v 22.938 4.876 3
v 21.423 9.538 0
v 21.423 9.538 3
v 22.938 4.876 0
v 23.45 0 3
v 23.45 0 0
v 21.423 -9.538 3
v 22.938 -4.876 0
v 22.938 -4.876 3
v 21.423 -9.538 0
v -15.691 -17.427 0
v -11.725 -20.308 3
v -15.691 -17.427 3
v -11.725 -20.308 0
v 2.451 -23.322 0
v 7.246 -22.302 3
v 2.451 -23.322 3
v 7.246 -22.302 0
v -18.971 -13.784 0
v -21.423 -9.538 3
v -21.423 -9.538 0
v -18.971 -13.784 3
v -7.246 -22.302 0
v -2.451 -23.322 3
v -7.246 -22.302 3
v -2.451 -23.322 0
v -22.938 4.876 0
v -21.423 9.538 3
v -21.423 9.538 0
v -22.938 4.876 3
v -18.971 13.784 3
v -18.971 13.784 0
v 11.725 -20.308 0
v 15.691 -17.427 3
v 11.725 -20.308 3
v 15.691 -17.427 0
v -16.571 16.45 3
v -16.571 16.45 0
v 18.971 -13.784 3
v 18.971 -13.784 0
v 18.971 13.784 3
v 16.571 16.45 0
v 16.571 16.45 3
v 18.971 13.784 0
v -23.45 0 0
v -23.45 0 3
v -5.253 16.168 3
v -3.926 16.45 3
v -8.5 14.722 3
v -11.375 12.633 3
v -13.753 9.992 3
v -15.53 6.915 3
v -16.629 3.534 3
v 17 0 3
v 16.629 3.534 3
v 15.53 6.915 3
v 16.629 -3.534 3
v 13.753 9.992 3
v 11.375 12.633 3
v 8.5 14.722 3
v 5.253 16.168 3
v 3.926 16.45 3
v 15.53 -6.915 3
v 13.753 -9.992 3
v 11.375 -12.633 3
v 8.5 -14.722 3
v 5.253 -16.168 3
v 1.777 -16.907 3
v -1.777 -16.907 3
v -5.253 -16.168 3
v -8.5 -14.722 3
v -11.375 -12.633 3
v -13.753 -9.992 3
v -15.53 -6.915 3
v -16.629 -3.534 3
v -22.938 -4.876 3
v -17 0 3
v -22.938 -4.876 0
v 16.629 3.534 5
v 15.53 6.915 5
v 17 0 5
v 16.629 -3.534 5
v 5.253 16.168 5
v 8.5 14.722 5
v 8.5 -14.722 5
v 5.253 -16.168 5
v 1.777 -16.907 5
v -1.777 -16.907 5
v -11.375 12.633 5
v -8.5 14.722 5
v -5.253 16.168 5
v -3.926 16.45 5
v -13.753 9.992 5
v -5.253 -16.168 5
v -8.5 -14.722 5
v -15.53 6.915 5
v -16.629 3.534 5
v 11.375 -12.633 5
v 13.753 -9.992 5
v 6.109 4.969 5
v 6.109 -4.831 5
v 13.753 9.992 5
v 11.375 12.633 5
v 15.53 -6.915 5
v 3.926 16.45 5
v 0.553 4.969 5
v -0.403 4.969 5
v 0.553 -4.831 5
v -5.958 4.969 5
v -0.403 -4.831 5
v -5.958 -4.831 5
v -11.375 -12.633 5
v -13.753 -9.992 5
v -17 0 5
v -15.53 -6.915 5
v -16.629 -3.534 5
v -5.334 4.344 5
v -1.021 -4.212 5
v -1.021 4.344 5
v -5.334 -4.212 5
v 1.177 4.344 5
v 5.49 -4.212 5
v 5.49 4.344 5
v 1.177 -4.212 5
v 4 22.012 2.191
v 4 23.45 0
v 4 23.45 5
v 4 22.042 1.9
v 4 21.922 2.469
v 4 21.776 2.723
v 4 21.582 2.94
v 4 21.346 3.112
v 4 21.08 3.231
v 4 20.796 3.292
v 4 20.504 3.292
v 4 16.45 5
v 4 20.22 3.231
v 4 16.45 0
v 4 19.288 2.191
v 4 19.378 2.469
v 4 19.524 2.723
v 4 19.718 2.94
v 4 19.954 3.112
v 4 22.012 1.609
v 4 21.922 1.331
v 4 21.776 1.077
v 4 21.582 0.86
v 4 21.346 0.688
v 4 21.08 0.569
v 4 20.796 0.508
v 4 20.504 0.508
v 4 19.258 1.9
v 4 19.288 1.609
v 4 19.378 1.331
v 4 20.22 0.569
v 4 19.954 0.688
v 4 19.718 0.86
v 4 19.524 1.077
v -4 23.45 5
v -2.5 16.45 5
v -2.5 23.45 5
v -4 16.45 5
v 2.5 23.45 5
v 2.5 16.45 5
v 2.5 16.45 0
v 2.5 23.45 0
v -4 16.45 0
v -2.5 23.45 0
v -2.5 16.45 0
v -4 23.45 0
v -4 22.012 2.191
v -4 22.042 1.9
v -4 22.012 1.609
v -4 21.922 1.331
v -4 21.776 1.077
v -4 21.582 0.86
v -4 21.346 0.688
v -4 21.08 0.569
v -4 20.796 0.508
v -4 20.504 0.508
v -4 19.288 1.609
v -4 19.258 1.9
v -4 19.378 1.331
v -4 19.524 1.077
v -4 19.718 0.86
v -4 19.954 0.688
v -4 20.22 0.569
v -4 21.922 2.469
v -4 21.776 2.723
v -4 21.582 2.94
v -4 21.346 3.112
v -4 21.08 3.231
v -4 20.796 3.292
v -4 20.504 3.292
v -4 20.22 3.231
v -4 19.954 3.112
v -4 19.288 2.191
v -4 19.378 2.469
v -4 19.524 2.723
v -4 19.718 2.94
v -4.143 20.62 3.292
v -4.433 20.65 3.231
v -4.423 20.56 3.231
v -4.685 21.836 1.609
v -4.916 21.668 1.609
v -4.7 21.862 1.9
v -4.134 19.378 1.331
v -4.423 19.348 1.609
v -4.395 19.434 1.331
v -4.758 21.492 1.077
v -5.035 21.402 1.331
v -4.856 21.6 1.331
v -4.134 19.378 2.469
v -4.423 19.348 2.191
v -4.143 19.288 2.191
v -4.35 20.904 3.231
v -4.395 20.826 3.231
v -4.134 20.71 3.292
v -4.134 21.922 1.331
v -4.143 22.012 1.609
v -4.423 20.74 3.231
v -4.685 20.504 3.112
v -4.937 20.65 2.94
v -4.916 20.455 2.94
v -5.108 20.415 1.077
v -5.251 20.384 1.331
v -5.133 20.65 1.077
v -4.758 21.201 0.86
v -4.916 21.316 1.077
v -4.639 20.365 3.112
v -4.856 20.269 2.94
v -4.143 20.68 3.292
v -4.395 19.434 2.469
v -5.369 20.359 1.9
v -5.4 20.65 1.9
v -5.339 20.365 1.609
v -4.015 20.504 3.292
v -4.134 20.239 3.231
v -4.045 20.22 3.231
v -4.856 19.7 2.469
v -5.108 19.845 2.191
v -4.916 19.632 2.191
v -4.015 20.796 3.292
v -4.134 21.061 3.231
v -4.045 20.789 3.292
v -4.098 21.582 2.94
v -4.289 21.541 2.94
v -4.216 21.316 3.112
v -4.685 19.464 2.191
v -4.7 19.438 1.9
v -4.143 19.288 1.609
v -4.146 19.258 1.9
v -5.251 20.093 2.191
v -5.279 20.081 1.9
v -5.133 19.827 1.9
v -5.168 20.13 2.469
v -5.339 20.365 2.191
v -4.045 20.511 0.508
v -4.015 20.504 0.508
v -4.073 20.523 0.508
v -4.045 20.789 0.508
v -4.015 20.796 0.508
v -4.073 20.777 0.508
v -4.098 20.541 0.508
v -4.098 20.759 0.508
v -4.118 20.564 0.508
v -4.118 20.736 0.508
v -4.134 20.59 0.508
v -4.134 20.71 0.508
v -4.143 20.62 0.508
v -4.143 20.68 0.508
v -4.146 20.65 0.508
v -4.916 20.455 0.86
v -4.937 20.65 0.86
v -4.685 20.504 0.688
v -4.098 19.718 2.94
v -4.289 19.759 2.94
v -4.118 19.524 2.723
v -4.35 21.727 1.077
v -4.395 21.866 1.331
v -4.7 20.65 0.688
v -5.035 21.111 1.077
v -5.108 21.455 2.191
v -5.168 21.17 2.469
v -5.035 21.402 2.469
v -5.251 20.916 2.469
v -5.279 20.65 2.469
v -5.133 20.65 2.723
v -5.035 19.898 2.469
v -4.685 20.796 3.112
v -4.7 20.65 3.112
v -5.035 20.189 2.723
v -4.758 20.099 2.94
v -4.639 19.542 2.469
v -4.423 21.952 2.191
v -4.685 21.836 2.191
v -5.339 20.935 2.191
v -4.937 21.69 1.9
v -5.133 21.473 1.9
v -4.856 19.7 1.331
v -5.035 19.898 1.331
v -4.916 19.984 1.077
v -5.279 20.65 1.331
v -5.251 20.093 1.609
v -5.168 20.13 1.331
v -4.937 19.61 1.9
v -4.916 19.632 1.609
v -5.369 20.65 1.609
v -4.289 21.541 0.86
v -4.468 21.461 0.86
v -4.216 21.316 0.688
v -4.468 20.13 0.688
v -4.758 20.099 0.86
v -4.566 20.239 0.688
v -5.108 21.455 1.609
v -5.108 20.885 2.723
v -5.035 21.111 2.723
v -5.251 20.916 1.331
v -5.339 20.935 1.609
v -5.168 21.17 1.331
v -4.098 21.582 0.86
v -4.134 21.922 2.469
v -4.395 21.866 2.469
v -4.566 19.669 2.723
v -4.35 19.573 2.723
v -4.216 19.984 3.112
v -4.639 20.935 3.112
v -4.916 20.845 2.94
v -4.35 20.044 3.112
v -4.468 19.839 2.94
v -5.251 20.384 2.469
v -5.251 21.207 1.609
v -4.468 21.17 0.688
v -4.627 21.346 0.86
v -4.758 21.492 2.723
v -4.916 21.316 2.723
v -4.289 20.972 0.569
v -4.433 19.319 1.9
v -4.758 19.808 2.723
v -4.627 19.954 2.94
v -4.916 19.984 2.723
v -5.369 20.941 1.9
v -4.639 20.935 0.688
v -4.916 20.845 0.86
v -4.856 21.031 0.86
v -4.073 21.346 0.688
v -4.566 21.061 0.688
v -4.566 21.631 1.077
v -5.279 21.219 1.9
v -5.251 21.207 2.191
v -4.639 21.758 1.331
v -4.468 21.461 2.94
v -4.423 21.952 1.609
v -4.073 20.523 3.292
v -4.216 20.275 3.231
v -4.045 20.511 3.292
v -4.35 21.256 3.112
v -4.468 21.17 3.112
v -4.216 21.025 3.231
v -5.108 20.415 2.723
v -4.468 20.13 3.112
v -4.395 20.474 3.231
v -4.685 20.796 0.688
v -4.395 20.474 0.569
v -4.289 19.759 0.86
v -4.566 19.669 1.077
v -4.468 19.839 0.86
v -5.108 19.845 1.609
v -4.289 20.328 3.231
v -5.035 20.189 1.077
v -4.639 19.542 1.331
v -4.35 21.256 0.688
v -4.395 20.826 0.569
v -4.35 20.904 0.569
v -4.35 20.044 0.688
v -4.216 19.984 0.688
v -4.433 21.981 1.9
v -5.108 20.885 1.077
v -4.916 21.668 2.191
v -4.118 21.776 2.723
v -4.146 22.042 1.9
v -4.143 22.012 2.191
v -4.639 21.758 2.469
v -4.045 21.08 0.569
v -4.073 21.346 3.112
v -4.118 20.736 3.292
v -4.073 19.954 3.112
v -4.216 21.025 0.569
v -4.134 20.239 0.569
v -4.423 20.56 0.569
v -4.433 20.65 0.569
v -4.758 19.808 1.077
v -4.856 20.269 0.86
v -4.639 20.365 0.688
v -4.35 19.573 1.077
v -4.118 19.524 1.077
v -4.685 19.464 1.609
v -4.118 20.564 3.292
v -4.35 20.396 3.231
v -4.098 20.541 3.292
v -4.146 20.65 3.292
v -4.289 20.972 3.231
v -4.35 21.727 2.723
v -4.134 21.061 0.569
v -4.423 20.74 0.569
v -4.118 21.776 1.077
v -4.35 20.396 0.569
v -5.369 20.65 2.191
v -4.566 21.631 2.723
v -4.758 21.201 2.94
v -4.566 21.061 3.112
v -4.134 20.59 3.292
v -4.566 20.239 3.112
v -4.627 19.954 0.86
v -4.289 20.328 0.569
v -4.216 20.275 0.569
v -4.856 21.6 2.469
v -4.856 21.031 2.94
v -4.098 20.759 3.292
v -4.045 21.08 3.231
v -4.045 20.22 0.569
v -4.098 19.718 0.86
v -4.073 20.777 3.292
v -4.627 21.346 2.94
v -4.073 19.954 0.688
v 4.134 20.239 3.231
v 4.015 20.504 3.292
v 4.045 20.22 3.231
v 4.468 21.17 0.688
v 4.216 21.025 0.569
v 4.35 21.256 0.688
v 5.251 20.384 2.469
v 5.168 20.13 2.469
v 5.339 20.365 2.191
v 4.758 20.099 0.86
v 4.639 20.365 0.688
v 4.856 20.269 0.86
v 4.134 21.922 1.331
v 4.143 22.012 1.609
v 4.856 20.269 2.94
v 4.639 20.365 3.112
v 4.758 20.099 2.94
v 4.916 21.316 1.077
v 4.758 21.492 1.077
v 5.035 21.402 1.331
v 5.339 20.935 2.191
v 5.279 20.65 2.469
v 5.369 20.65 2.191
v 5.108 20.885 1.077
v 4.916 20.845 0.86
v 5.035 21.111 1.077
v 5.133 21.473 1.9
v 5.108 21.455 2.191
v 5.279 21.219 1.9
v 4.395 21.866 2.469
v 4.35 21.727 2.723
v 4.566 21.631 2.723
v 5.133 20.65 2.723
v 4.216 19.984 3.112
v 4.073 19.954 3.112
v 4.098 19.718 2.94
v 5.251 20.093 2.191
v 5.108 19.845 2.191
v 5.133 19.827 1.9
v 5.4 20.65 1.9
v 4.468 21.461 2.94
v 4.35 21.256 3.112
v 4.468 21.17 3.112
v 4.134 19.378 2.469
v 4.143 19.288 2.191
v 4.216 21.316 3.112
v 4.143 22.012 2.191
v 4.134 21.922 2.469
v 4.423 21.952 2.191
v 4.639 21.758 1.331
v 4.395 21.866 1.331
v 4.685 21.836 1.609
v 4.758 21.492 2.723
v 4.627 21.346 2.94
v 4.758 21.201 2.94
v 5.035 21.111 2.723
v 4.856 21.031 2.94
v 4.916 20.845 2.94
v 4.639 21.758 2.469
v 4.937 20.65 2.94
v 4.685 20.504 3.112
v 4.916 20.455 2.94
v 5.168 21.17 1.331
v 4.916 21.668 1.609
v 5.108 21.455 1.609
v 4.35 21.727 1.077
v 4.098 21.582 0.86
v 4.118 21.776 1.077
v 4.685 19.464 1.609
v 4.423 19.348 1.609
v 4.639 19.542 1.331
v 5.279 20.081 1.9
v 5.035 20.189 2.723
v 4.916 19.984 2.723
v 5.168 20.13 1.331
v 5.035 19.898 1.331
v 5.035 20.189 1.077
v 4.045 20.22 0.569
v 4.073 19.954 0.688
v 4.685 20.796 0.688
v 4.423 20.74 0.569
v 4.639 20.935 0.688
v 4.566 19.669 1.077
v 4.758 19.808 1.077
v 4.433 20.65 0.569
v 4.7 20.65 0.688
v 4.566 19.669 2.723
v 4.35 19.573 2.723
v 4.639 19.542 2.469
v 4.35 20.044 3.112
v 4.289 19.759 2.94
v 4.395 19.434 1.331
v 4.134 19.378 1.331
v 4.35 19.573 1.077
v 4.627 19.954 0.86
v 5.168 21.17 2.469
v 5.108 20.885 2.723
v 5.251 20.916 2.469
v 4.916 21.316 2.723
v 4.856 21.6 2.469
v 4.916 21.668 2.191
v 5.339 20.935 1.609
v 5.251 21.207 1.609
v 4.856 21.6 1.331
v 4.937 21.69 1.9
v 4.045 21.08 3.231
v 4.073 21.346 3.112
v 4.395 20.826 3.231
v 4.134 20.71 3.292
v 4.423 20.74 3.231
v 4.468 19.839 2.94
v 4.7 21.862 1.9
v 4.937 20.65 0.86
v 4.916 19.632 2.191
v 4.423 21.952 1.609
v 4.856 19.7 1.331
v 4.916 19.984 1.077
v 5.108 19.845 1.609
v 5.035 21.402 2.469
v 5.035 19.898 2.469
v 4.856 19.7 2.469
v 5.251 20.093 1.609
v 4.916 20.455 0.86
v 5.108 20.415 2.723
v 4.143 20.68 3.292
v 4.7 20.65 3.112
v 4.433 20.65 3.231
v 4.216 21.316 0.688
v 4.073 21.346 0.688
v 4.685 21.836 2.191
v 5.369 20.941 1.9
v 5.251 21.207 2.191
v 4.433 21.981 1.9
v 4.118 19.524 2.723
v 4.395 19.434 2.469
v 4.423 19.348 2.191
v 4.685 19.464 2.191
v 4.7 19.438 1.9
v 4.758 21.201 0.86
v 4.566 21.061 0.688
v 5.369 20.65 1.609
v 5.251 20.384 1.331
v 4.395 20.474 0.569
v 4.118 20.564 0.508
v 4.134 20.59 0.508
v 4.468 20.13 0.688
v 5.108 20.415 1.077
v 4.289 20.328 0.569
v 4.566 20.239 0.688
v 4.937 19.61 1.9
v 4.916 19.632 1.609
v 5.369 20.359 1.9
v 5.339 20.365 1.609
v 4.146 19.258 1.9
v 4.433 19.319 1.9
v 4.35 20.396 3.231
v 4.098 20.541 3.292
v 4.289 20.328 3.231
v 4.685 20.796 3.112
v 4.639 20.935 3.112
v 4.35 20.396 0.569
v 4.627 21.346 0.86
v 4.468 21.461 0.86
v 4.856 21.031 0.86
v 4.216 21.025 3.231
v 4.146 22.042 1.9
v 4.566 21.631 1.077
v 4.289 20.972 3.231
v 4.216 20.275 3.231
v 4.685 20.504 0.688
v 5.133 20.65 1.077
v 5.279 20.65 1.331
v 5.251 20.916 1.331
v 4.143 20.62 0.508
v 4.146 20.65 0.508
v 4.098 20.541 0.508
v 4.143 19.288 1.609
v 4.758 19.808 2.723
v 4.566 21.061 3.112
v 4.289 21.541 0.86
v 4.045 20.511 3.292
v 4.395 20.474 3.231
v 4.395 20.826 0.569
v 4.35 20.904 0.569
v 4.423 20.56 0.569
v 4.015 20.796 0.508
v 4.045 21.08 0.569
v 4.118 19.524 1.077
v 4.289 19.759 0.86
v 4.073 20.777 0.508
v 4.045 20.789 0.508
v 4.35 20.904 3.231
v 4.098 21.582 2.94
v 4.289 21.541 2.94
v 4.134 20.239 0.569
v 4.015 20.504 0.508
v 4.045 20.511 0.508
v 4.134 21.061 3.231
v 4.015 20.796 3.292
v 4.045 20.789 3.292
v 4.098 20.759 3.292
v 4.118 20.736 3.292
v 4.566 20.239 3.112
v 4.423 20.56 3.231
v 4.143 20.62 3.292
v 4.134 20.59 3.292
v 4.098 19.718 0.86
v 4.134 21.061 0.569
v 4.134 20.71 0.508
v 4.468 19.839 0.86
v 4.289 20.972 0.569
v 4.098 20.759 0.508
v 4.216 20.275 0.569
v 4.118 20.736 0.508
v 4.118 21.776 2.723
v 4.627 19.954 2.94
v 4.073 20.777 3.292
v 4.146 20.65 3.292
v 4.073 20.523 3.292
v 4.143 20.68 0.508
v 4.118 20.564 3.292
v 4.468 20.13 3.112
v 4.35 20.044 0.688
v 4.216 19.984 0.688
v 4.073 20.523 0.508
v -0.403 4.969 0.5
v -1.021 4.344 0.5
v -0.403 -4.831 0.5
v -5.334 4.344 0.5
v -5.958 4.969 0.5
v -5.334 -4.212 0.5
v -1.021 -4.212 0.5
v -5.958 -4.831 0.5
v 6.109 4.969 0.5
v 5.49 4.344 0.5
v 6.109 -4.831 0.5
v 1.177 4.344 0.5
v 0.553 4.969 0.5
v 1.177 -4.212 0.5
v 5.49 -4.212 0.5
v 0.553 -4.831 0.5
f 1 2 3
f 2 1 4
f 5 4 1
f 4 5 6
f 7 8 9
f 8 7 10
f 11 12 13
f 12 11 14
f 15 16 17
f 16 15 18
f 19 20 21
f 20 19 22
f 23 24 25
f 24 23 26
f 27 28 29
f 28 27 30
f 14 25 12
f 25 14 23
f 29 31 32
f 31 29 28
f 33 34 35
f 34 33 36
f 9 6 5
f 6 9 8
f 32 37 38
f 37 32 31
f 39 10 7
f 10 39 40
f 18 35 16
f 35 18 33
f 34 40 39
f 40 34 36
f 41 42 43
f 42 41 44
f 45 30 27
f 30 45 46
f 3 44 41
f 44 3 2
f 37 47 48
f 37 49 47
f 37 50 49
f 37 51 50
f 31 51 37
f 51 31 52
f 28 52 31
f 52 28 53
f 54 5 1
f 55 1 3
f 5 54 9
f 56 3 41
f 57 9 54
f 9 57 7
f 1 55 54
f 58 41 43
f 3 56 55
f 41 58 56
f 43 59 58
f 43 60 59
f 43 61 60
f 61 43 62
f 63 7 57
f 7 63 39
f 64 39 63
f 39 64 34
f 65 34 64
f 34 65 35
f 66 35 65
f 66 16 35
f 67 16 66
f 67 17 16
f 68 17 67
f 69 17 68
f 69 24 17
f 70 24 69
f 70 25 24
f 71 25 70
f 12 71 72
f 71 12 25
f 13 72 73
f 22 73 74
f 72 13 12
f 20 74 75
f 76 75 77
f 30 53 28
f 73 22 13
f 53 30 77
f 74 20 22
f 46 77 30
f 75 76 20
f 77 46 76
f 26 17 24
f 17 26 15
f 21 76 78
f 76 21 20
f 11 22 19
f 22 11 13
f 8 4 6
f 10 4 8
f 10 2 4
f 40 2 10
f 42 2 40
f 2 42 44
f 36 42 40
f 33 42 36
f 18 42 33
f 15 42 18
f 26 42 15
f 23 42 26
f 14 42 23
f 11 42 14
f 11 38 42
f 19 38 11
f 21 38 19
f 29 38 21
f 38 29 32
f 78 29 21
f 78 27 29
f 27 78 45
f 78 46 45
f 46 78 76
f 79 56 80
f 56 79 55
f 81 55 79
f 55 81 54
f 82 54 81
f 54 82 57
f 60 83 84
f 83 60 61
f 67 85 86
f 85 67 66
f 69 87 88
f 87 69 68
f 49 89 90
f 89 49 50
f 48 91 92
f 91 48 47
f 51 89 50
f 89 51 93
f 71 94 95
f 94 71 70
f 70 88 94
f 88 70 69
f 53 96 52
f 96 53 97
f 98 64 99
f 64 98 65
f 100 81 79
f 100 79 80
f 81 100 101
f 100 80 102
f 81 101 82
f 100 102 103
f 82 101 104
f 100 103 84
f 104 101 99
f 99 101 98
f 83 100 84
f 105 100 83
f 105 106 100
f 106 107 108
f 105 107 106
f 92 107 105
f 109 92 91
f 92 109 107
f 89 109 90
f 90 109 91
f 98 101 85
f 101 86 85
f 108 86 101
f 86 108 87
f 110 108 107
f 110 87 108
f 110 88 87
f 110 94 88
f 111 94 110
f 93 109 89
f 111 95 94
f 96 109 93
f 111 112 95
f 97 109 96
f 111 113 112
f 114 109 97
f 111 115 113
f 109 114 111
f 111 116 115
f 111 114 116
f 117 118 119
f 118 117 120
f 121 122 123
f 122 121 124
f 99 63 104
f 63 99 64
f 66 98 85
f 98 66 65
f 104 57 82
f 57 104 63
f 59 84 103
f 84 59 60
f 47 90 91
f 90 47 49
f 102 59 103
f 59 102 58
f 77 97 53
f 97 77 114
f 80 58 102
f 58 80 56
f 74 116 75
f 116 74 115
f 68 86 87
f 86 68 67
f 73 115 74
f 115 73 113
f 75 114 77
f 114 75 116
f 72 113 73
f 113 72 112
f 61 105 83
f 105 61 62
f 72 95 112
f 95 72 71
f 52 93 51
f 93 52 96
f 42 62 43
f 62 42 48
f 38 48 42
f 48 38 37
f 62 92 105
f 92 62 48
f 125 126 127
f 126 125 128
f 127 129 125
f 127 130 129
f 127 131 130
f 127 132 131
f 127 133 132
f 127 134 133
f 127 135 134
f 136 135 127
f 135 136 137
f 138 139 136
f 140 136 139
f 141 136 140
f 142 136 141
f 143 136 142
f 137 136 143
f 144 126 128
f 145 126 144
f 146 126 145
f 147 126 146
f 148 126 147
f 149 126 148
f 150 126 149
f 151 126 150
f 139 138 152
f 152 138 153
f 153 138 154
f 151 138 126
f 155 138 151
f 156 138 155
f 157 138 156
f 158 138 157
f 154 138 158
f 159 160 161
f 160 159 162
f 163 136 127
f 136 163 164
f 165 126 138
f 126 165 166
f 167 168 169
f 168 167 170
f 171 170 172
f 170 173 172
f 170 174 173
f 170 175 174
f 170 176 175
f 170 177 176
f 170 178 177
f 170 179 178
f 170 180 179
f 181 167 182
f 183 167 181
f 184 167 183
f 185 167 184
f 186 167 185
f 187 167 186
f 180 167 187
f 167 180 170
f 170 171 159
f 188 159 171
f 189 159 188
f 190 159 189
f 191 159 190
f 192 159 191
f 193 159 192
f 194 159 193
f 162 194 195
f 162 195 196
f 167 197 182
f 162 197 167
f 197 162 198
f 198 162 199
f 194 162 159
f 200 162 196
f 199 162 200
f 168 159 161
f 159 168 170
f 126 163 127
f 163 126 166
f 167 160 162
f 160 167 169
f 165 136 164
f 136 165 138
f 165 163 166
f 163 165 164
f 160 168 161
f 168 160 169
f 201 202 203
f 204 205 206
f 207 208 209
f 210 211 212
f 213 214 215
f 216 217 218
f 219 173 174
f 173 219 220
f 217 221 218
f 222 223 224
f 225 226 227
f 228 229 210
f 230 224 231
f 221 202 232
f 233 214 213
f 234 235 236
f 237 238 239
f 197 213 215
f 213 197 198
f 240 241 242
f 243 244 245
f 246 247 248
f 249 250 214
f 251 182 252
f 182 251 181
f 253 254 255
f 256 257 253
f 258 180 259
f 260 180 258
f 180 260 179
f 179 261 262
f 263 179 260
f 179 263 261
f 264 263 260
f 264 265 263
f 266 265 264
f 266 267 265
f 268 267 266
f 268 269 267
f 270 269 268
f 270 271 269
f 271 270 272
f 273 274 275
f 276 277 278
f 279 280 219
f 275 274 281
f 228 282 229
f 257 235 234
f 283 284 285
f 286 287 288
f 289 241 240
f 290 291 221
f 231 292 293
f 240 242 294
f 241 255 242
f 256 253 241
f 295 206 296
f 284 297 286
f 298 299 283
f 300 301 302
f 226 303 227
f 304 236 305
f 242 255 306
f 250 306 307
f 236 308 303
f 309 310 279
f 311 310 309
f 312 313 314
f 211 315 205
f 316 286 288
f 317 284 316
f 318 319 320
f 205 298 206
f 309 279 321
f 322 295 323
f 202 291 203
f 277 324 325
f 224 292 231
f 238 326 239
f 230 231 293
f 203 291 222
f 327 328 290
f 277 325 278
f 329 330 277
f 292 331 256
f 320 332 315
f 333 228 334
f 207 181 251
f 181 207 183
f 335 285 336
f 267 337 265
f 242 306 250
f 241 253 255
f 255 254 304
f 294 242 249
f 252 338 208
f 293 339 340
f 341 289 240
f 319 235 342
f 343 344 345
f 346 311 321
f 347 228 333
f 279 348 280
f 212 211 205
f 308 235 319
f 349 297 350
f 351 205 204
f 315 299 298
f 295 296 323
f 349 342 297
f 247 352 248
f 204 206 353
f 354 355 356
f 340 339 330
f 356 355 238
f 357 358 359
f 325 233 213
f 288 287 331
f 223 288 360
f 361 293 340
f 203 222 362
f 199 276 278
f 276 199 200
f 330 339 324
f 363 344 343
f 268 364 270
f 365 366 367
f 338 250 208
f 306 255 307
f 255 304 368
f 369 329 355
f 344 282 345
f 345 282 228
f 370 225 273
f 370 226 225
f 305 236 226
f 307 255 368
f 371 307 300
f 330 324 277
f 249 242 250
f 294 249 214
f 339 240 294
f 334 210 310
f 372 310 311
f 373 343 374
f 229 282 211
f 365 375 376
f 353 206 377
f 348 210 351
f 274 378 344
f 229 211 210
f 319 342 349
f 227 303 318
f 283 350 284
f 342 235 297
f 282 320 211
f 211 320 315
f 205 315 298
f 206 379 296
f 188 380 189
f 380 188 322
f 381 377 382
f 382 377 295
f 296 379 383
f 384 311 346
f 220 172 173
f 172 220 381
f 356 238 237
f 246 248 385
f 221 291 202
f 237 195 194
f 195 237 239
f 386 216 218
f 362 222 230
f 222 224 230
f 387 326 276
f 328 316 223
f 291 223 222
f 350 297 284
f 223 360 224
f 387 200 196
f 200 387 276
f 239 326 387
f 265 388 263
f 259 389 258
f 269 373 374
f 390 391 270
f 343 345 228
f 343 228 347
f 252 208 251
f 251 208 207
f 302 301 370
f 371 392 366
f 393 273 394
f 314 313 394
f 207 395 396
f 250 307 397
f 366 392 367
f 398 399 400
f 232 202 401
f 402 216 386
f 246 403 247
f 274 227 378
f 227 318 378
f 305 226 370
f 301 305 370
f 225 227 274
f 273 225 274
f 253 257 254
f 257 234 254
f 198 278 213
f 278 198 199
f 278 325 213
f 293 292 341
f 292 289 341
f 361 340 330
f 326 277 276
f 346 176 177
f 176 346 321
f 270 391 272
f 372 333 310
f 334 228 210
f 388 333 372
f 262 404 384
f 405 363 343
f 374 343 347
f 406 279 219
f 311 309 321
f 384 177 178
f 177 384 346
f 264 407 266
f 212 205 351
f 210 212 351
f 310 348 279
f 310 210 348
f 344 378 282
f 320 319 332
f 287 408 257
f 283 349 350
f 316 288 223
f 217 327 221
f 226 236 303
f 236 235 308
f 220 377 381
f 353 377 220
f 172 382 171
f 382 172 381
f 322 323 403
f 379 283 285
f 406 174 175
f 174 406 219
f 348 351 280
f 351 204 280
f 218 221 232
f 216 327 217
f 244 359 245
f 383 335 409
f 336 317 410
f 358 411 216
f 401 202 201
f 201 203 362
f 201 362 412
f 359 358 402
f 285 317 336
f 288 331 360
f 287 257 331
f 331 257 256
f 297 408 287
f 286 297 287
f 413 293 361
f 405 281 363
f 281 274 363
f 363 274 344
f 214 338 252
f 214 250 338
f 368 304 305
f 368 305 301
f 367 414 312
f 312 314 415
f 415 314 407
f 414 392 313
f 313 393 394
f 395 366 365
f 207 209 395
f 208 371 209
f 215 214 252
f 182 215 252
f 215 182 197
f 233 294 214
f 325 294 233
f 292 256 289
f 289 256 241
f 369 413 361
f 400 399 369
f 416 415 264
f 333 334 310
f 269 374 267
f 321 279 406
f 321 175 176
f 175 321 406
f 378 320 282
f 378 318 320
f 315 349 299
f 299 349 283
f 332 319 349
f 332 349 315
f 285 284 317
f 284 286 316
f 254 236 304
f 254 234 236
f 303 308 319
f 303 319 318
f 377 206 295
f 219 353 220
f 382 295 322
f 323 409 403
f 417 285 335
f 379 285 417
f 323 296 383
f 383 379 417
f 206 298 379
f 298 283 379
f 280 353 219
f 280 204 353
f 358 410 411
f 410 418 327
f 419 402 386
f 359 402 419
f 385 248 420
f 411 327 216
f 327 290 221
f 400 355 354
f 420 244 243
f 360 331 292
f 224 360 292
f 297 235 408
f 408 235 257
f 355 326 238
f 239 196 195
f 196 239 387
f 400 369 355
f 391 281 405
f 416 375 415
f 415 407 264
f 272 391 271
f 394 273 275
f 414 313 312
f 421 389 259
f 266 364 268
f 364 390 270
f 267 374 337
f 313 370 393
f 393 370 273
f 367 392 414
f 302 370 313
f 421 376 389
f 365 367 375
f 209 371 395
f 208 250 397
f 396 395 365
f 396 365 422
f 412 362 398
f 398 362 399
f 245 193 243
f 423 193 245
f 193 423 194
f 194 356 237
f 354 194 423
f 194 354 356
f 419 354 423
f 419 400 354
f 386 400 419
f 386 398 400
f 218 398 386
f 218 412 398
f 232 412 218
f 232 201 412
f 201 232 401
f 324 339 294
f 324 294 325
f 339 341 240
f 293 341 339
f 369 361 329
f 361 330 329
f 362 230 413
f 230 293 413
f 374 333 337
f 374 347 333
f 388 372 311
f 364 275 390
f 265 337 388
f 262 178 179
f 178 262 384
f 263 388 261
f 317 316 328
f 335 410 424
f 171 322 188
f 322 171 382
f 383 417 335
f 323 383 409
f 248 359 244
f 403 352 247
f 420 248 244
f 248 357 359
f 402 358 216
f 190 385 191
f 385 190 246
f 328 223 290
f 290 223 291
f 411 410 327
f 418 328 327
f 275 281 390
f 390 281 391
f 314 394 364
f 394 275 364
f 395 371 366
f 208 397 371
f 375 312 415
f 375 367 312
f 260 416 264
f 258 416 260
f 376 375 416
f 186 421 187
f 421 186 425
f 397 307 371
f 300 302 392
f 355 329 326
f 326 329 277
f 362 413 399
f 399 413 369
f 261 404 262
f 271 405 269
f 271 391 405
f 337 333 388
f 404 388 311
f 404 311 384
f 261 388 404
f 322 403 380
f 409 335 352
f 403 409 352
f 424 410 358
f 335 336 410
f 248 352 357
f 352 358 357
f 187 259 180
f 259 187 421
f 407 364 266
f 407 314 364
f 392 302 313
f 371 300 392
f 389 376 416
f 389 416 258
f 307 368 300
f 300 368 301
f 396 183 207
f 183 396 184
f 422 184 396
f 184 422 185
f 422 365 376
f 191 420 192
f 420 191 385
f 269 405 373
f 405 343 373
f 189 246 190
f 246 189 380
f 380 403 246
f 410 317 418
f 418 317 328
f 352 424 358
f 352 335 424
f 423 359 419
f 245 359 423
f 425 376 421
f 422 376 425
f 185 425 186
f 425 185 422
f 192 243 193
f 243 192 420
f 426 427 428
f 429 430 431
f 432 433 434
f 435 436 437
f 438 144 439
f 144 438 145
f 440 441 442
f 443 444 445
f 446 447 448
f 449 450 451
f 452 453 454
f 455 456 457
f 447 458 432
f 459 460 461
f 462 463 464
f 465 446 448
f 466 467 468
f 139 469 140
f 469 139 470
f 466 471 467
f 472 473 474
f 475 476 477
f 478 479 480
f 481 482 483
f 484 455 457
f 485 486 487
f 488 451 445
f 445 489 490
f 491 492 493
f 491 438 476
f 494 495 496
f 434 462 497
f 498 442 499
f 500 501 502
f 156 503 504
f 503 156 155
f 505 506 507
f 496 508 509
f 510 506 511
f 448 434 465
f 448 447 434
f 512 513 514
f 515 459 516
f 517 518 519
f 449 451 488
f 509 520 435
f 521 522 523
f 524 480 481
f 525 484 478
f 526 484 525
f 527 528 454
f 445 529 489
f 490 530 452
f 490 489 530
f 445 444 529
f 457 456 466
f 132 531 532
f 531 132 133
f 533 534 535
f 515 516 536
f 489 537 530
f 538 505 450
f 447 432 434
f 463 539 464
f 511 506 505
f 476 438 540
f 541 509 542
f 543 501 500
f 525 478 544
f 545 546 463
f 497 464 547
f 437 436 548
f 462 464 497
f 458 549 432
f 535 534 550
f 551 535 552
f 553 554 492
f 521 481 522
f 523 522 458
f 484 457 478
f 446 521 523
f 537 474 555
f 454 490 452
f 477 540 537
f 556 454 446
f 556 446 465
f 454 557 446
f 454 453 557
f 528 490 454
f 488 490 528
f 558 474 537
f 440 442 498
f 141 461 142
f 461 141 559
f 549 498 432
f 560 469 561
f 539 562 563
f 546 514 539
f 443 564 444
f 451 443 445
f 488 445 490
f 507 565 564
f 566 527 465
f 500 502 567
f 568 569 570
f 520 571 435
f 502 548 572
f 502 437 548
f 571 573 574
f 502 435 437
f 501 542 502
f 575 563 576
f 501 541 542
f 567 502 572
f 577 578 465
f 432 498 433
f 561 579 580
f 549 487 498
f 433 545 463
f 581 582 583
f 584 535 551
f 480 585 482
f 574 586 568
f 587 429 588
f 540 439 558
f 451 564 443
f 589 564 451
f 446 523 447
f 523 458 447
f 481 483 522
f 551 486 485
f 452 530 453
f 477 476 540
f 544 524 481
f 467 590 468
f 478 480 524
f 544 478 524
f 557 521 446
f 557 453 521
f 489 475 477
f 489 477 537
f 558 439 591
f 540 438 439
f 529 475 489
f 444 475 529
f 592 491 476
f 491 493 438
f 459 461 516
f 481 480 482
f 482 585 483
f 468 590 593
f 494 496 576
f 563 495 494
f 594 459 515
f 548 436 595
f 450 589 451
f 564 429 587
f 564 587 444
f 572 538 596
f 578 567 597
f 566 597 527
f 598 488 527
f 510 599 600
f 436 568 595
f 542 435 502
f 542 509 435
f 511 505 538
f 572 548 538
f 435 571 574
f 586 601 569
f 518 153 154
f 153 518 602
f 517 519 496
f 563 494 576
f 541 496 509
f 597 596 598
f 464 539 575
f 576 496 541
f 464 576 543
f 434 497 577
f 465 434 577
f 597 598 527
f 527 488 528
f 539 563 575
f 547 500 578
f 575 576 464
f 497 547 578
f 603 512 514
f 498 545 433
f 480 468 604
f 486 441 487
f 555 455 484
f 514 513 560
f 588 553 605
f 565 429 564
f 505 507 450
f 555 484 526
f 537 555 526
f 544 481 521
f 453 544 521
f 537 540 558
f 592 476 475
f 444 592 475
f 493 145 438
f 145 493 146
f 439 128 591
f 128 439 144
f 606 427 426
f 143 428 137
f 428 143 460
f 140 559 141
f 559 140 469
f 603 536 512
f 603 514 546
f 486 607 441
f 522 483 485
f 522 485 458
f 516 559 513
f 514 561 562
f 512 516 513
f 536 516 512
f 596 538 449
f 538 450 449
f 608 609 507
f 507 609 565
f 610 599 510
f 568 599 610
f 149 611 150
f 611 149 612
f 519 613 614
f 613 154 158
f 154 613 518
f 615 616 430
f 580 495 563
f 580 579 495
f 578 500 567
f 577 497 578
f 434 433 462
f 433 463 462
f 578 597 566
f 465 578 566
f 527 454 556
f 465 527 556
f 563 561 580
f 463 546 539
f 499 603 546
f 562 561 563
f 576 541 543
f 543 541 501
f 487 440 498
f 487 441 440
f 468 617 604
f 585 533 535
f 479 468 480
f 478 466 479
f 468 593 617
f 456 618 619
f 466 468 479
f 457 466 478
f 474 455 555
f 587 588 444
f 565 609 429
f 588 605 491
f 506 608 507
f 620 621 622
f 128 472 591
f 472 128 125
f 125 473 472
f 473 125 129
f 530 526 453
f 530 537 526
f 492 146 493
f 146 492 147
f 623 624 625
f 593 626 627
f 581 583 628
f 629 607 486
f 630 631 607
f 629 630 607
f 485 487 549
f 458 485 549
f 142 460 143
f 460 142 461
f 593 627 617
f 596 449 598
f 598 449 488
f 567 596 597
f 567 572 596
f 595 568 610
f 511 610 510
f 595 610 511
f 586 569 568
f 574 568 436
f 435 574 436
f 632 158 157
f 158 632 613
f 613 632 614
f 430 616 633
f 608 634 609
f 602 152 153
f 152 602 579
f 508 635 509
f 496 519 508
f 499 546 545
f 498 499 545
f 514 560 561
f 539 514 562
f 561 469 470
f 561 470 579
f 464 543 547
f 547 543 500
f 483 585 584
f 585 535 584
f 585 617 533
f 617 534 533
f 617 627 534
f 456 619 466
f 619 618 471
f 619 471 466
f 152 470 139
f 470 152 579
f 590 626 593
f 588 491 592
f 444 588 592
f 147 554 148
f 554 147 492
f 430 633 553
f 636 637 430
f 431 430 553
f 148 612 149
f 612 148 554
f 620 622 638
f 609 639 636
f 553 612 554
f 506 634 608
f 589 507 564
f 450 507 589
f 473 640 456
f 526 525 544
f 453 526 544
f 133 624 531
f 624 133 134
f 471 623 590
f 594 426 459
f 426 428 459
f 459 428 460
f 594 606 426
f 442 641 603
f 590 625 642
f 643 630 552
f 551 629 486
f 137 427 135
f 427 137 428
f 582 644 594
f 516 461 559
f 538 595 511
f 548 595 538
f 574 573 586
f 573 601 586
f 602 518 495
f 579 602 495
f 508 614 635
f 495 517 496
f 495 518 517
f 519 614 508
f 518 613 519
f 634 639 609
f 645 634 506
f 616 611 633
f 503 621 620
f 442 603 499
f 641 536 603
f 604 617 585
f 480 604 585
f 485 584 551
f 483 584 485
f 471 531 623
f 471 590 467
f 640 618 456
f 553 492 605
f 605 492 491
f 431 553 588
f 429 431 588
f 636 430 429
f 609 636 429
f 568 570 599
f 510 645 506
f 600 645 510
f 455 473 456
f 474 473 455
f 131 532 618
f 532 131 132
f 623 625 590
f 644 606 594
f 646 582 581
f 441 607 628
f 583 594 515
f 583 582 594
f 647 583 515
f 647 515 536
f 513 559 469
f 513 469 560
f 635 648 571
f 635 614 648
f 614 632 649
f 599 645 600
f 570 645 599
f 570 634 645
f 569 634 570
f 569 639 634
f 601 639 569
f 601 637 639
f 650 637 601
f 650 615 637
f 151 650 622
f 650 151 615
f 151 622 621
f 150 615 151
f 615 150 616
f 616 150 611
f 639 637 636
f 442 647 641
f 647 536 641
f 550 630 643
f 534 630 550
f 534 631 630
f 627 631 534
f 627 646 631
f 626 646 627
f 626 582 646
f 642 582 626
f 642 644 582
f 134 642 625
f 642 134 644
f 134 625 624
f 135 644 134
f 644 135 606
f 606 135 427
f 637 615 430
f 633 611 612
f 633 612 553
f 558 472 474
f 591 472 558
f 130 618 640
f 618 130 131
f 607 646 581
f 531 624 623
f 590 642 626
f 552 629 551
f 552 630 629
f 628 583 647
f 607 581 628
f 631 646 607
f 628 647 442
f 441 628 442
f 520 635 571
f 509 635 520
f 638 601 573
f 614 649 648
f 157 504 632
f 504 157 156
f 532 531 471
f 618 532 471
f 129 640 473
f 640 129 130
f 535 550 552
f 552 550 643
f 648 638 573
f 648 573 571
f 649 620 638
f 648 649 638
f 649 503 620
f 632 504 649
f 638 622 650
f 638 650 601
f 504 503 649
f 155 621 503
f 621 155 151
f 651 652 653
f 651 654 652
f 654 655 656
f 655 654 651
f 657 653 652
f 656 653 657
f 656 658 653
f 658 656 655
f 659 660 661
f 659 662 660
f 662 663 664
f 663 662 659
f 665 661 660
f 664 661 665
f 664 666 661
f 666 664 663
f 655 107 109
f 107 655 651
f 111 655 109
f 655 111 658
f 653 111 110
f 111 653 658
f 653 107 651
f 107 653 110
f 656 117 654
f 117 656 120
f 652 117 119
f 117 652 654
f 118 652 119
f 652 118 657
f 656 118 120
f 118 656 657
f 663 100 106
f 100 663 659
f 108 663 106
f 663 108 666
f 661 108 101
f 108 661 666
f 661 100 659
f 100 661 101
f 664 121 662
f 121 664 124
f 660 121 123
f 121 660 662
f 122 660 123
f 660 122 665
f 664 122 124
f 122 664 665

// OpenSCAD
$fn = 30;

BASE_HEIGHT = 3;
BASE_DIA = 46.9;

INNER_HEIGHT = 2;
INNER_DIA = 34; // 34.5

HOLDER_SIZEX = 8;
HOLDER_SIZEY = 7;
// should be less than 9mm
HOLDER_HEIGHT = BASE_HEIGHT + INNER_HEIGHT;
HOLDER_THICKNESS = 1.5;

AXIS_TO_REF = 1.1;
AXIS_TO_TOP = 2.8; // 2.4
AXIS_DIA = 2.8;
AXIS_X = HOLDER_SIZEX / 2;
AXIS_Y = BASE_DIA/2 - AXIS_TO_TOP;
AXIS_Z = BASE_HEIGHT - AXIS_TO_REF;

TEXT_THICKNESS = 0.5;

difference() {
	union() {
		difference() {
			union() {
				cylinder(h=BASE_HEIGHT, d=BASE_DIA);
				translate([0, 0, BASE_HEIGHT])
					cylinder(h=INNER_HEIGHT, d=INNER_DIA);
			};
			
			translate([0, -HOLDER_SIZEY/2+BASE_DIA/2, 0])
				cube([9999, HOLDER_SIZEY, 9999], center=true);
		}

		translate([0, -HOLDER_SIZEY/2+BASE_DIA/2, HOLDER_HEIGHT/2])
			difference() {
				cube([HOLDER_SIZEX, HOLDER_SIZEY, HOLDER_HEIGHT], center=true);
				cube([HOLDER_SIZEX-2*HOLDER_THICKNESS, HOLDER_SIZEY, HOLDER_HEIGHT], center=true);
			}

		translate([-AXIS_X, AXIS_Y, AXIS_Z])
			sphere(d=AXIS_DIA);
		translate([AXIS_X, AXIS_Y, AXIS_Z])
			sphere(d=AXIS_DIA);

	}

	translate([0, 0, TEXT_THICKNESS])
		linear_extrude(height=BASE_HEIGHT+INNER_HEIGHT-TEXT_THICKNESS)
			text("别瞅", font="微软雅黑", size=8, halign="center", valign="center");
}
